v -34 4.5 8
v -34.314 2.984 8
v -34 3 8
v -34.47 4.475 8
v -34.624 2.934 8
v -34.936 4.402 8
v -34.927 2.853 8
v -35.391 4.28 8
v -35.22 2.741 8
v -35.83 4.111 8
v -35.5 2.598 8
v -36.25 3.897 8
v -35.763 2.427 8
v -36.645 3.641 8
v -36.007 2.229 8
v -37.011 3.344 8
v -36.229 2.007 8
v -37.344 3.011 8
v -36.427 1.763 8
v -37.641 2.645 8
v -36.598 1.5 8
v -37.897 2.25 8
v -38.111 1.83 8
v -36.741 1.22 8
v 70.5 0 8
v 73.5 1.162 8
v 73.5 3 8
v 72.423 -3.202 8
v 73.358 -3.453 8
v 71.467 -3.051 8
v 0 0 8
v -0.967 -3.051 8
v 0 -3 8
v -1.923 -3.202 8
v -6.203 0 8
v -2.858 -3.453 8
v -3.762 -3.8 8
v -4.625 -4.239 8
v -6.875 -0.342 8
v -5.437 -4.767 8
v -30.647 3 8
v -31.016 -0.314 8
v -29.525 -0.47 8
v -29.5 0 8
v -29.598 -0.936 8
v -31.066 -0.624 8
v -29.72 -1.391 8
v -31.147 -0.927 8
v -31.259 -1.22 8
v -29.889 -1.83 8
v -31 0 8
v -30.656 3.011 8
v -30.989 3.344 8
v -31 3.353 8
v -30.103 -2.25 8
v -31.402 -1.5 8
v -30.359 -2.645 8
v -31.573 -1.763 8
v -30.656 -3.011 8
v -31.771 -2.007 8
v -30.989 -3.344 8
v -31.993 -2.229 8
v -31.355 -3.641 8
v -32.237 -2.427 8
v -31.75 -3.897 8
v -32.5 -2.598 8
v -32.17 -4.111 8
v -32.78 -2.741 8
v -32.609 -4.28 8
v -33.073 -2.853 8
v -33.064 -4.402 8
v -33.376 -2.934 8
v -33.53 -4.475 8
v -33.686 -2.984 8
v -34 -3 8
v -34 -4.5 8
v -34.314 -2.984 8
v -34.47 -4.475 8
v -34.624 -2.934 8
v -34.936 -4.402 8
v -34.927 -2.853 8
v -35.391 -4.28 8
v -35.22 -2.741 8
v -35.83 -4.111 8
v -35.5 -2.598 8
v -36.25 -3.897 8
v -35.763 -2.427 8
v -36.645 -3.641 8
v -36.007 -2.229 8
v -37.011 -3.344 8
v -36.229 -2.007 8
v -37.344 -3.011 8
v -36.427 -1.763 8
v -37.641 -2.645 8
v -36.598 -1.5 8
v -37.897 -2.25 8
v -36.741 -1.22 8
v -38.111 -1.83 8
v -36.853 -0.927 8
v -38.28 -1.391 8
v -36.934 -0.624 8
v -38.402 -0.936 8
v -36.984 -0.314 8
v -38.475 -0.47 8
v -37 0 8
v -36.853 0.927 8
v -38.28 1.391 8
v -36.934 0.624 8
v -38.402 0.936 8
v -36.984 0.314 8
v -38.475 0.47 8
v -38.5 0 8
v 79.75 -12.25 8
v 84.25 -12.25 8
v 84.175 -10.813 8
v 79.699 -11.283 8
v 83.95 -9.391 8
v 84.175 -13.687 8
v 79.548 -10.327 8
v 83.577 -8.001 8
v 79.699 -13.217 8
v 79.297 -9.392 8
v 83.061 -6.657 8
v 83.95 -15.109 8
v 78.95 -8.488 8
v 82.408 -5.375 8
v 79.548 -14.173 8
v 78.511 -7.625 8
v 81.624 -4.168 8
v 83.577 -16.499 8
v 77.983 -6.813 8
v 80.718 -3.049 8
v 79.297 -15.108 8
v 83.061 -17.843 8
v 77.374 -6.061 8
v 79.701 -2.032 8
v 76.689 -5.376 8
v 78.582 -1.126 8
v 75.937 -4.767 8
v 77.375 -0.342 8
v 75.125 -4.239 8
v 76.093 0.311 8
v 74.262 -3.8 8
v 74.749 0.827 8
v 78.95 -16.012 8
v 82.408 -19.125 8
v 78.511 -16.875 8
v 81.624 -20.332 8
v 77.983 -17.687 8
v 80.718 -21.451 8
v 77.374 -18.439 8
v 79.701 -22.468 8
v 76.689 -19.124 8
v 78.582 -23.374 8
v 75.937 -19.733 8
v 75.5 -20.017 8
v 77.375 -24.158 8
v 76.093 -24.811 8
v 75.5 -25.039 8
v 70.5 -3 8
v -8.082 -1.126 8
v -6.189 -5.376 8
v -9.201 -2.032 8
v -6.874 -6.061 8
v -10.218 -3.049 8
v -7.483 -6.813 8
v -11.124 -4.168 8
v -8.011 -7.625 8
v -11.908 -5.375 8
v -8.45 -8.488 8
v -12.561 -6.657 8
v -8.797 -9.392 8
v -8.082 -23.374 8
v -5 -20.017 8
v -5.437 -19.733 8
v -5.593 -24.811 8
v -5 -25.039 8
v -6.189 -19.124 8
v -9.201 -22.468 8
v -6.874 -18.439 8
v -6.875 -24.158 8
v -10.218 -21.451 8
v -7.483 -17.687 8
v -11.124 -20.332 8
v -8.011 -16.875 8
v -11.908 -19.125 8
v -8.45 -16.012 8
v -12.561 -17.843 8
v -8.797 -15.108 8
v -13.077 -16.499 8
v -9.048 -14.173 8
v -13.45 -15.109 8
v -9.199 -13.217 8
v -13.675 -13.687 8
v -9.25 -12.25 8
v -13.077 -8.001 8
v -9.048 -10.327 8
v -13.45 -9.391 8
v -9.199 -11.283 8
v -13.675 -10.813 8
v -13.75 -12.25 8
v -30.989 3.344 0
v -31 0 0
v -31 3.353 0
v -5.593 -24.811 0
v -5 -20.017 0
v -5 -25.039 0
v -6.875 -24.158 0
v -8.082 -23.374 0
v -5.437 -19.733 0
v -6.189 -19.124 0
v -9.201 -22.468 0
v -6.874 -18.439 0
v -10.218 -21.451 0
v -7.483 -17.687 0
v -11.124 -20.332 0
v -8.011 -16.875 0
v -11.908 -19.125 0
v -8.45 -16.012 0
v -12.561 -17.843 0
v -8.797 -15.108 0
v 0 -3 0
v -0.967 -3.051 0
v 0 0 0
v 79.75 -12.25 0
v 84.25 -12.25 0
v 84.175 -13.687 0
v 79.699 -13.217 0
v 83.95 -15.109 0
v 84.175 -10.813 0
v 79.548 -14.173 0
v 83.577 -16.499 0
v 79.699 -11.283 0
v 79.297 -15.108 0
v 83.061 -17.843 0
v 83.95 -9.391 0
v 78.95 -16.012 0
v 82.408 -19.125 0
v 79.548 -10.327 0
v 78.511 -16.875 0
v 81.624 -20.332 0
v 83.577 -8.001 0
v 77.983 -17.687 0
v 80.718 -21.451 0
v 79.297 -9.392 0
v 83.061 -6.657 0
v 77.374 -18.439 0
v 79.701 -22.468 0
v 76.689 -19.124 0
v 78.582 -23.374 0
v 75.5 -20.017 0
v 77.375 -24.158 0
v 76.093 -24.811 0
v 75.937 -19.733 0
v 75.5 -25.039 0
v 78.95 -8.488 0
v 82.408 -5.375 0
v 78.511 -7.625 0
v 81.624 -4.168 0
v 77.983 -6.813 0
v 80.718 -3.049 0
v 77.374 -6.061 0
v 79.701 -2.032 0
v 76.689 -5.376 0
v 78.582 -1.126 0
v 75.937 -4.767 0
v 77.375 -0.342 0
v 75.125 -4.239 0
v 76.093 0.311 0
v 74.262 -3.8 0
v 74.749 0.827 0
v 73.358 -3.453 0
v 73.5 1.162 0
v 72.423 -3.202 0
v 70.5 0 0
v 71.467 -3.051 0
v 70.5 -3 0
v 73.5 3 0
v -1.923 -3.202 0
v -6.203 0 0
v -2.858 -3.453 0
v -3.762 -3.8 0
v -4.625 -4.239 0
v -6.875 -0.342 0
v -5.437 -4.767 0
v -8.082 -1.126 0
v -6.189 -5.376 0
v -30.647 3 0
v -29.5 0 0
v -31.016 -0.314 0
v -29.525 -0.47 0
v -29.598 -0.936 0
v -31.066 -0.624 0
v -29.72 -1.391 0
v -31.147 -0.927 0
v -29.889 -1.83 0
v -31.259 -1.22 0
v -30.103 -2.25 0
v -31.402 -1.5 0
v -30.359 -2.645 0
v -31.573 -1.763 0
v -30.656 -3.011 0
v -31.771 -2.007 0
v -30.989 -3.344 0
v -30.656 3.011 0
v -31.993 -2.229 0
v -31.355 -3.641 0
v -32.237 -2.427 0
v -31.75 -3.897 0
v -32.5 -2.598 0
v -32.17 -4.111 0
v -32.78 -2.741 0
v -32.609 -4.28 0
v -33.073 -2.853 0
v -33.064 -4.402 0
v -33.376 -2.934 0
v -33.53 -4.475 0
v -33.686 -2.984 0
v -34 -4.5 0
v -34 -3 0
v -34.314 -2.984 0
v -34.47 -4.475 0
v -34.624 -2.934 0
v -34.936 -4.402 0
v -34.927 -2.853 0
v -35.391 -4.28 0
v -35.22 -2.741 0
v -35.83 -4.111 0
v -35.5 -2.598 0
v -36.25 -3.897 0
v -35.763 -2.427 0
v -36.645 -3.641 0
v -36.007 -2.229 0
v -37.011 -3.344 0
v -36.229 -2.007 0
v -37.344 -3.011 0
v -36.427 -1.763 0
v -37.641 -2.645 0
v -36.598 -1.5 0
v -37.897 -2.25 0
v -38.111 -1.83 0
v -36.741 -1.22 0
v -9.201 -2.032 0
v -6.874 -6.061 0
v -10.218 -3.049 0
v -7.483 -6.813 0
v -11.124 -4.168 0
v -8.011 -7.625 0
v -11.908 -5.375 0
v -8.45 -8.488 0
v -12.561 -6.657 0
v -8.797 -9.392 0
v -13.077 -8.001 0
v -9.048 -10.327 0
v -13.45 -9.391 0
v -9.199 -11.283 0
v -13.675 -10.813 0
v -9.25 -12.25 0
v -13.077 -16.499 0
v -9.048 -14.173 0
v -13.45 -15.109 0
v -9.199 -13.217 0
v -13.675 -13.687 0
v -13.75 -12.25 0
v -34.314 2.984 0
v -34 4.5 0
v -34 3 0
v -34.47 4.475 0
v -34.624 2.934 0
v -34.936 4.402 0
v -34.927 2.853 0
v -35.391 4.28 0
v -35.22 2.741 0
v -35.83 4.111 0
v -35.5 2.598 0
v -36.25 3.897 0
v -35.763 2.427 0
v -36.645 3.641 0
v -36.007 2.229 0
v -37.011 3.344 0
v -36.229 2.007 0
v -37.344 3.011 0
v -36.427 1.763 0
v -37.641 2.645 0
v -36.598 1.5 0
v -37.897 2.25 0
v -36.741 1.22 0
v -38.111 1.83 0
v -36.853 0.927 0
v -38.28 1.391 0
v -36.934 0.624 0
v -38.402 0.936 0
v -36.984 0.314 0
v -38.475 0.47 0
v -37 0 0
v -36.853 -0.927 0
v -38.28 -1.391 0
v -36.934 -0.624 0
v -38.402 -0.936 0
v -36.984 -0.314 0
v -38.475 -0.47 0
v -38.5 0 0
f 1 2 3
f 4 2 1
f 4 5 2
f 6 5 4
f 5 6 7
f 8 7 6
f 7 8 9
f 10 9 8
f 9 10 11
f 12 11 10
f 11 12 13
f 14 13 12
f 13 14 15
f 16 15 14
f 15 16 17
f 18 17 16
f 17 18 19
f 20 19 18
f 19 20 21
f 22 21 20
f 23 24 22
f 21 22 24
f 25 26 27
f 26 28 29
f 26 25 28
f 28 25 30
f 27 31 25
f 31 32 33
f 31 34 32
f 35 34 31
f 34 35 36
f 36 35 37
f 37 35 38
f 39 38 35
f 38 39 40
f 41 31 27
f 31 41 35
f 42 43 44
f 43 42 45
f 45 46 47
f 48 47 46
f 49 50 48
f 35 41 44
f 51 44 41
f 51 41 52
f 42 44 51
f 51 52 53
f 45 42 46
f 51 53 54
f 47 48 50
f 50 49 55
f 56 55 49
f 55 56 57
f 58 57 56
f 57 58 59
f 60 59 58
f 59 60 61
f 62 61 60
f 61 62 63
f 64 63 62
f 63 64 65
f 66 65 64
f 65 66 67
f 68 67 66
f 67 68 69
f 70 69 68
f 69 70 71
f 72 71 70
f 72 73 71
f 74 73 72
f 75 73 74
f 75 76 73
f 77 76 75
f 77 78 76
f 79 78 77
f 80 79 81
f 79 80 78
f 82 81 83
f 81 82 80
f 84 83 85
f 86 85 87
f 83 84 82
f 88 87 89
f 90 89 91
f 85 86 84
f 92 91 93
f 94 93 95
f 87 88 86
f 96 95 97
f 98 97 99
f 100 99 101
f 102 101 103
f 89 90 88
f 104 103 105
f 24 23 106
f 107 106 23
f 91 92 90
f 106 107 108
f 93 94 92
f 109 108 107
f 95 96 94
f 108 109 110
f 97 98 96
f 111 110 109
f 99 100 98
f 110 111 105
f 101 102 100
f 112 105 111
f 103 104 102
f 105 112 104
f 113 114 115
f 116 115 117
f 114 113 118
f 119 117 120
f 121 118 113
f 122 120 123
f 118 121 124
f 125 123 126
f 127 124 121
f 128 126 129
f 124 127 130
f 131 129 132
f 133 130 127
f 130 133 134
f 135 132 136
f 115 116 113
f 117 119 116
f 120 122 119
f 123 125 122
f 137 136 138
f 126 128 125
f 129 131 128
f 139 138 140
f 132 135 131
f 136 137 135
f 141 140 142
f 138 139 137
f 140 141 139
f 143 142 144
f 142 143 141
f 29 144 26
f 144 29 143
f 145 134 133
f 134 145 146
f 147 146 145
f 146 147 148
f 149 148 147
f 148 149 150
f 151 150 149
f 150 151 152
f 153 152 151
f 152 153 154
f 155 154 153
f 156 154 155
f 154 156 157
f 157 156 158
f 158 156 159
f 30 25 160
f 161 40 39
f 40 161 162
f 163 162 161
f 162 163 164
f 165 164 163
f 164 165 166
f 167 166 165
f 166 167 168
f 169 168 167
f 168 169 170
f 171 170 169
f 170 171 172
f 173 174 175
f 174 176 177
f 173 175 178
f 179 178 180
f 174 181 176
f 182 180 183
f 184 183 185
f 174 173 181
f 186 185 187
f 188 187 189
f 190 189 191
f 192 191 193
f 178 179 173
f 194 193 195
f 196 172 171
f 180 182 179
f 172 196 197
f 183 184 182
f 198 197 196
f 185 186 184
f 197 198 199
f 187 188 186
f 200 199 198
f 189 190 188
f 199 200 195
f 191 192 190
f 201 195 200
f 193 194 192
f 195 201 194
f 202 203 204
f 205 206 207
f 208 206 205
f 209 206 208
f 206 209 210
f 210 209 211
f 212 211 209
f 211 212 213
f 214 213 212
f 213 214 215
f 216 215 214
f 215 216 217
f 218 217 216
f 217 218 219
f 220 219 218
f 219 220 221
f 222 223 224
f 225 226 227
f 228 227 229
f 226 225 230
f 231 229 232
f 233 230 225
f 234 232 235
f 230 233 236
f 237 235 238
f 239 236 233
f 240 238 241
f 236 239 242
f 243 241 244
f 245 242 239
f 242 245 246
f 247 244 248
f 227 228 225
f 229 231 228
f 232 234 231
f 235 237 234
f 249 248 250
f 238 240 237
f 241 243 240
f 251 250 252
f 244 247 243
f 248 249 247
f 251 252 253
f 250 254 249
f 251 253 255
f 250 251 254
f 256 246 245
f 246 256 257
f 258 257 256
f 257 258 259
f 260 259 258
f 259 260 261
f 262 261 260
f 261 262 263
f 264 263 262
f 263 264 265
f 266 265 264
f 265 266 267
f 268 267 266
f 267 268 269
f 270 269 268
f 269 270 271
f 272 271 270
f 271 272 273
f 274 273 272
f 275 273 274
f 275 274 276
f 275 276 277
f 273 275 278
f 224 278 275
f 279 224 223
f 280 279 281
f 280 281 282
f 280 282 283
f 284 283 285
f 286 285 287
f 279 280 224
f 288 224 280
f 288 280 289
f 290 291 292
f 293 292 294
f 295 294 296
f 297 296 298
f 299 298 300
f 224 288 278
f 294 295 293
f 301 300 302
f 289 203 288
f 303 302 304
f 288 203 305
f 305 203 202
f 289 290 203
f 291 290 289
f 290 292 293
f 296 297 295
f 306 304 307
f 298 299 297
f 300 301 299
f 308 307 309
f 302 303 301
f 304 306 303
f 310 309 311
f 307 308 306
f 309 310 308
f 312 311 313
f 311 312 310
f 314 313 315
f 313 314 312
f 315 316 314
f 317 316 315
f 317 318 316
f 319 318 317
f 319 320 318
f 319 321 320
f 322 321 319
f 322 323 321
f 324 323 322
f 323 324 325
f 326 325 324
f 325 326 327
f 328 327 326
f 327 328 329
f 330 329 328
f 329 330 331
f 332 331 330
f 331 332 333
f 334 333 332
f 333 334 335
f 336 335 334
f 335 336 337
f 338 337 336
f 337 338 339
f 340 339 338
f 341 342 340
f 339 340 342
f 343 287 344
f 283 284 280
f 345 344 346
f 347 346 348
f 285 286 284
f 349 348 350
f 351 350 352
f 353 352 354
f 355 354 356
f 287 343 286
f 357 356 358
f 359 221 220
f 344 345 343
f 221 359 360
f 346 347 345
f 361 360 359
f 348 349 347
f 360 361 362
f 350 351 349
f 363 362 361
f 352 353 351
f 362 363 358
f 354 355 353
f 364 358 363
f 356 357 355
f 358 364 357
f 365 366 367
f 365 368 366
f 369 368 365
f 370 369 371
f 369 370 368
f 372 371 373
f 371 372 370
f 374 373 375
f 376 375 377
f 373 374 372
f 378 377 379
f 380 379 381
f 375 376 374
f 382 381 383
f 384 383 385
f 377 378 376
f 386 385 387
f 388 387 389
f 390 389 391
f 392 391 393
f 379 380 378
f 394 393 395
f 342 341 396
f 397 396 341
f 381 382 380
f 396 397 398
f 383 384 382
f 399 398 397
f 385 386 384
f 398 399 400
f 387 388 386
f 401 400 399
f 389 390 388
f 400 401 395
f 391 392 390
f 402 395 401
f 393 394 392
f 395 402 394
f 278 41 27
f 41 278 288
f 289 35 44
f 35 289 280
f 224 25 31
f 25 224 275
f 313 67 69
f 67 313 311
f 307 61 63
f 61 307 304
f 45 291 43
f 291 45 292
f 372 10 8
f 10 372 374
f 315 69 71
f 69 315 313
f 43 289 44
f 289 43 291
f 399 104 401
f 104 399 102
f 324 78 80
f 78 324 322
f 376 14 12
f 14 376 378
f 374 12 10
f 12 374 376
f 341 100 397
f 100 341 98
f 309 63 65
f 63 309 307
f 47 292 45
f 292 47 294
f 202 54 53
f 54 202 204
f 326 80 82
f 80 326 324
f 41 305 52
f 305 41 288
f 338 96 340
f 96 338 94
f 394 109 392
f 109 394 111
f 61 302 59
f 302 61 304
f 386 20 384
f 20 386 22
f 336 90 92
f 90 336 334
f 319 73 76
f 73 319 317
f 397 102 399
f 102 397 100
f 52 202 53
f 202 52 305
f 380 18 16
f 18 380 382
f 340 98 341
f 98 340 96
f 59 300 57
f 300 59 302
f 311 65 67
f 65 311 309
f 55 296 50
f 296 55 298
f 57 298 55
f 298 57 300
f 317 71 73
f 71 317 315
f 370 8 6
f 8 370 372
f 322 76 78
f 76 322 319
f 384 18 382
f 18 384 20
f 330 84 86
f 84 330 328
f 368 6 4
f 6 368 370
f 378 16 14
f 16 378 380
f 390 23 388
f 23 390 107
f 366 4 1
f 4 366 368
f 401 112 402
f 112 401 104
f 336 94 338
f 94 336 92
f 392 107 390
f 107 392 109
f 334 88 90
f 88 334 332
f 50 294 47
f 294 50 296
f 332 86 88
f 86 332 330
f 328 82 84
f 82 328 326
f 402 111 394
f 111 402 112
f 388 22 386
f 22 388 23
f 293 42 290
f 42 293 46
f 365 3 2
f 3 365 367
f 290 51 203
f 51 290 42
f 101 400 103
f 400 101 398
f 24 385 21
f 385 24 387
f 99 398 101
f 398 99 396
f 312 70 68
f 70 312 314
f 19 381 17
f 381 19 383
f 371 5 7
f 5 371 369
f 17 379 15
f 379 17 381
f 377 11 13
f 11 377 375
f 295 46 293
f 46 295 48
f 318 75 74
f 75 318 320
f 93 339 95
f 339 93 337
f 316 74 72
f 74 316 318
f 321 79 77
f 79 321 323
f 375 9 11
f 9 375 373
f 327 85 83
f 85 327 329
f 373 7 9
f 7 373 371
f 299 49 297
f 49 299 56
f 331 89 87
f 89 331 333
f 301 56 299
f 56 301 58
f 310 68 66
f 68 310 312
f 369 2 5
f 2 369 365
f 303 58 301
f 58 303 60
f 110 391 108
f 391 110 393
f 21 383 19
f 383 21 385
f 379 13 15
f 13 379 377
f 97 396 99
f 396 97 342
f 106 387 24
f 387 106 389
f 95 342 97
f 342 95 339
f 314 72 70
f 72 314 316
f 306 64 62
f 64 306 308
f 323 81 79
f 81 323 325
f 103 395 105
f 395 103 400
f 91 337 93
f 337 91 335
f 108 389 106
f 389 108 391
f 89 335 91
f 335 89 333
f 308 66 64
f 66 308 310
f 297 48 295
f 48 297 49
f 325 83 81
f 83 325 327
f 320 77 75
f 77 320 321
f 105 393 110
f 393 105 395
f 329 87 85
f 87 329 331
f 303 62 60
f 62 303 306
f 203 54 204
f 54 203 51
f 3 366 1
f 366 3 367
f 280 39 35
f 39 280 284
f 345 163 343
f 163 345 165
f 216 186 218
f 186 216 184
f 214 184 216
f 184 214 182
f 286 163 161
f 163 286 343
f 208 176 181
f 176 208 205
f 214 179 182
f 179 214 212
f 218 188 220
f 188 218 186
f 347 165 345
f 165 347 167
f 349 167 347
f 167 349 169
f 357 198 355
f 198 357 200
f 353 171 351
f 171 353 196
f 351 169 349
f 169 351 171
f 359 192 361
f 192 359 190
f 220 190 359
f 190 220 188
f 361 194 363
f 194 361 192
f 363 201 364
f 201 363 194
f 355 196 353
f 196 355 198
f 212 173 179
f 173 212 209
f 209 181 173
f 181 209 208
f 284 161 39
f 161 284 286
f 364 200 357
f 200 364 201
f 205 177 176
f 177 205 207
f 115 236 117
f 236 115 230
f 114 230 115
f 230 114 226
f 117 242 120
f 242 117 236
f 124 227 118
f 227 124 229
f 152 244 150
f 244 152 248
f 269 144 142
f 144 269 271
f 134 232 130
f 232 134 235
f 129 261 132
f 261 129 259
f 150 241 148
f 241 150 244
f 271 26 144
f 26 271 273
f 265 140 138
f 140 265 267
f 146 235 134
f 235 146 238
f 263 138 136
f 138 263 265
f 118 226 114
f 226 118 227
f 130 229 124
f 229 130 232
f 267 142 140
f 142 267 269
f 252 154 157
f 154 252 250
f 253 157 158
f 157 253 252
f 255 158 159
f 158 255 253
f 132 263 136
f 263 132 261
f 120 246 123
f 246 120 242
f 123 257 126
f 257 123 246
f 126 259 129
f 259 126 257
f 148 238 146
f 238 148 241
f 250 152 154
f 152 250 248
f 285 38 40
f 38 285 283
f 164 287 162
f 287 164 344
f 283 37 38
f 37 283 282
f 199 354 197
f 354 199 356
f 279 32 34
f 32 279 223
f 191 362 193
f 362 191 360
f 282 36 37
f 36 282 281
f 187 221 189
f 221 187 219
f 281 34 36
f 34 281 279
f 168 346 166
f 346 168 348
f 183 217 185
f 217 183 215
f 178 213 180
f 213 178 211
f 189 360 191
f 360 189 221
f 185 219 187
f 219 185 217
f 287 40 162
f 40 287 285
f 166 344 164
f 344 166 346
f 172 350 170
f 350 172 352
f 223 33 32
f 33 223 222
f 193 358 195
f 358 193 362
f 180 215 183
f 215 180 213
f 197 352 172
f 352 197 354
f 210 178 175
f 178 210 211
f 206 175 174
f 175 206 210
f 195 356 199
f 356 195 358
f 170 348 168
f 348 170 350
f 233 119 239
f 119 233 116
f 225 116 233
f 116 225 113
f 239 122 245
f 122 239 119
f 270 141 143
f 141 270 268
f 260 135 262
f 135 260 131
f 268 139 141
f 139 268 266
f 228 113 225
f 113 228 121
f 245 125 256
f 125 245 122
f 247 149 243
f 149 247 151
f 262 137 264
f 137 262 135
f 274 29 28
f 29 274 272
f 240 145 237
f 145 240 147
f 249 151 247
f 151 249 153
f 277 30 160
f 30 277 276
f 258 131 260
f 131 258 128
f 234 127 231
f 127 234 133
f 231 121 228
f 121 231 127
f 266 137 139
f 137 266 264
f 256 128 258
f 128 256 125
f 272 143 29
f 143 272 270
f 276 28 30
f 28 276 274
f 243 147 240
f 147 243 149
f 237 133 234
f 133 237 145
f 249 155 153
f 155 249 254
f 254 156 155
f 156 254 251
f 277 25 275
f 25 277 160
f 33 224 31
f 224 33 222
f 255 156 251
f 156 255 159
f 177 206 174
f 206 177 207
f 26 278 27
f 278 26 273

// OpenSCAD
thickness = 3;
depth = 8;
latch = 5;
arm = 28;
lights = 6;
$fn = 60;
translate([-thickness,0,0]){
cube([70.5 + 2*(thickness),thickness, depth]);
}
translate([-(arm+lights),0,0]){
difference(){
union(){
cube([arm+lights,thickness,depth]);
cylinder(d=lights+thickness,h=depth);
}
translate([0,0,-1]){
cylinder(d=lights,h=depth+2);
translate([0,0,0]){
cube([3,10,depth+2]);
}
}
}
}
translate([0,-9.25 - 3,0]){
difference(){
union(){    
cylinder(d=18.5+3*(thickness),h=depth);
translate([70.5,0,0]){
cylinder(d=18.5+3*(thickness),h=depth);
}
}
translate([0,0,-1]){
cylinder(d=18.5,h=depth+2);
translate([70.5,0,0]){
cylinder(d=18.5,h=depth+2);
}
translate([0,-9.25-(1.5*thickness),0]){
cube([70.5,18.5+3*(thickness), depth + 2]);
}
translate([-latch,-(1.5*thickness + 9.25),0]){
cube([70.5+(2*latch),9.25+(1.5*thickness),depth + 2]);
}
}
}
}
